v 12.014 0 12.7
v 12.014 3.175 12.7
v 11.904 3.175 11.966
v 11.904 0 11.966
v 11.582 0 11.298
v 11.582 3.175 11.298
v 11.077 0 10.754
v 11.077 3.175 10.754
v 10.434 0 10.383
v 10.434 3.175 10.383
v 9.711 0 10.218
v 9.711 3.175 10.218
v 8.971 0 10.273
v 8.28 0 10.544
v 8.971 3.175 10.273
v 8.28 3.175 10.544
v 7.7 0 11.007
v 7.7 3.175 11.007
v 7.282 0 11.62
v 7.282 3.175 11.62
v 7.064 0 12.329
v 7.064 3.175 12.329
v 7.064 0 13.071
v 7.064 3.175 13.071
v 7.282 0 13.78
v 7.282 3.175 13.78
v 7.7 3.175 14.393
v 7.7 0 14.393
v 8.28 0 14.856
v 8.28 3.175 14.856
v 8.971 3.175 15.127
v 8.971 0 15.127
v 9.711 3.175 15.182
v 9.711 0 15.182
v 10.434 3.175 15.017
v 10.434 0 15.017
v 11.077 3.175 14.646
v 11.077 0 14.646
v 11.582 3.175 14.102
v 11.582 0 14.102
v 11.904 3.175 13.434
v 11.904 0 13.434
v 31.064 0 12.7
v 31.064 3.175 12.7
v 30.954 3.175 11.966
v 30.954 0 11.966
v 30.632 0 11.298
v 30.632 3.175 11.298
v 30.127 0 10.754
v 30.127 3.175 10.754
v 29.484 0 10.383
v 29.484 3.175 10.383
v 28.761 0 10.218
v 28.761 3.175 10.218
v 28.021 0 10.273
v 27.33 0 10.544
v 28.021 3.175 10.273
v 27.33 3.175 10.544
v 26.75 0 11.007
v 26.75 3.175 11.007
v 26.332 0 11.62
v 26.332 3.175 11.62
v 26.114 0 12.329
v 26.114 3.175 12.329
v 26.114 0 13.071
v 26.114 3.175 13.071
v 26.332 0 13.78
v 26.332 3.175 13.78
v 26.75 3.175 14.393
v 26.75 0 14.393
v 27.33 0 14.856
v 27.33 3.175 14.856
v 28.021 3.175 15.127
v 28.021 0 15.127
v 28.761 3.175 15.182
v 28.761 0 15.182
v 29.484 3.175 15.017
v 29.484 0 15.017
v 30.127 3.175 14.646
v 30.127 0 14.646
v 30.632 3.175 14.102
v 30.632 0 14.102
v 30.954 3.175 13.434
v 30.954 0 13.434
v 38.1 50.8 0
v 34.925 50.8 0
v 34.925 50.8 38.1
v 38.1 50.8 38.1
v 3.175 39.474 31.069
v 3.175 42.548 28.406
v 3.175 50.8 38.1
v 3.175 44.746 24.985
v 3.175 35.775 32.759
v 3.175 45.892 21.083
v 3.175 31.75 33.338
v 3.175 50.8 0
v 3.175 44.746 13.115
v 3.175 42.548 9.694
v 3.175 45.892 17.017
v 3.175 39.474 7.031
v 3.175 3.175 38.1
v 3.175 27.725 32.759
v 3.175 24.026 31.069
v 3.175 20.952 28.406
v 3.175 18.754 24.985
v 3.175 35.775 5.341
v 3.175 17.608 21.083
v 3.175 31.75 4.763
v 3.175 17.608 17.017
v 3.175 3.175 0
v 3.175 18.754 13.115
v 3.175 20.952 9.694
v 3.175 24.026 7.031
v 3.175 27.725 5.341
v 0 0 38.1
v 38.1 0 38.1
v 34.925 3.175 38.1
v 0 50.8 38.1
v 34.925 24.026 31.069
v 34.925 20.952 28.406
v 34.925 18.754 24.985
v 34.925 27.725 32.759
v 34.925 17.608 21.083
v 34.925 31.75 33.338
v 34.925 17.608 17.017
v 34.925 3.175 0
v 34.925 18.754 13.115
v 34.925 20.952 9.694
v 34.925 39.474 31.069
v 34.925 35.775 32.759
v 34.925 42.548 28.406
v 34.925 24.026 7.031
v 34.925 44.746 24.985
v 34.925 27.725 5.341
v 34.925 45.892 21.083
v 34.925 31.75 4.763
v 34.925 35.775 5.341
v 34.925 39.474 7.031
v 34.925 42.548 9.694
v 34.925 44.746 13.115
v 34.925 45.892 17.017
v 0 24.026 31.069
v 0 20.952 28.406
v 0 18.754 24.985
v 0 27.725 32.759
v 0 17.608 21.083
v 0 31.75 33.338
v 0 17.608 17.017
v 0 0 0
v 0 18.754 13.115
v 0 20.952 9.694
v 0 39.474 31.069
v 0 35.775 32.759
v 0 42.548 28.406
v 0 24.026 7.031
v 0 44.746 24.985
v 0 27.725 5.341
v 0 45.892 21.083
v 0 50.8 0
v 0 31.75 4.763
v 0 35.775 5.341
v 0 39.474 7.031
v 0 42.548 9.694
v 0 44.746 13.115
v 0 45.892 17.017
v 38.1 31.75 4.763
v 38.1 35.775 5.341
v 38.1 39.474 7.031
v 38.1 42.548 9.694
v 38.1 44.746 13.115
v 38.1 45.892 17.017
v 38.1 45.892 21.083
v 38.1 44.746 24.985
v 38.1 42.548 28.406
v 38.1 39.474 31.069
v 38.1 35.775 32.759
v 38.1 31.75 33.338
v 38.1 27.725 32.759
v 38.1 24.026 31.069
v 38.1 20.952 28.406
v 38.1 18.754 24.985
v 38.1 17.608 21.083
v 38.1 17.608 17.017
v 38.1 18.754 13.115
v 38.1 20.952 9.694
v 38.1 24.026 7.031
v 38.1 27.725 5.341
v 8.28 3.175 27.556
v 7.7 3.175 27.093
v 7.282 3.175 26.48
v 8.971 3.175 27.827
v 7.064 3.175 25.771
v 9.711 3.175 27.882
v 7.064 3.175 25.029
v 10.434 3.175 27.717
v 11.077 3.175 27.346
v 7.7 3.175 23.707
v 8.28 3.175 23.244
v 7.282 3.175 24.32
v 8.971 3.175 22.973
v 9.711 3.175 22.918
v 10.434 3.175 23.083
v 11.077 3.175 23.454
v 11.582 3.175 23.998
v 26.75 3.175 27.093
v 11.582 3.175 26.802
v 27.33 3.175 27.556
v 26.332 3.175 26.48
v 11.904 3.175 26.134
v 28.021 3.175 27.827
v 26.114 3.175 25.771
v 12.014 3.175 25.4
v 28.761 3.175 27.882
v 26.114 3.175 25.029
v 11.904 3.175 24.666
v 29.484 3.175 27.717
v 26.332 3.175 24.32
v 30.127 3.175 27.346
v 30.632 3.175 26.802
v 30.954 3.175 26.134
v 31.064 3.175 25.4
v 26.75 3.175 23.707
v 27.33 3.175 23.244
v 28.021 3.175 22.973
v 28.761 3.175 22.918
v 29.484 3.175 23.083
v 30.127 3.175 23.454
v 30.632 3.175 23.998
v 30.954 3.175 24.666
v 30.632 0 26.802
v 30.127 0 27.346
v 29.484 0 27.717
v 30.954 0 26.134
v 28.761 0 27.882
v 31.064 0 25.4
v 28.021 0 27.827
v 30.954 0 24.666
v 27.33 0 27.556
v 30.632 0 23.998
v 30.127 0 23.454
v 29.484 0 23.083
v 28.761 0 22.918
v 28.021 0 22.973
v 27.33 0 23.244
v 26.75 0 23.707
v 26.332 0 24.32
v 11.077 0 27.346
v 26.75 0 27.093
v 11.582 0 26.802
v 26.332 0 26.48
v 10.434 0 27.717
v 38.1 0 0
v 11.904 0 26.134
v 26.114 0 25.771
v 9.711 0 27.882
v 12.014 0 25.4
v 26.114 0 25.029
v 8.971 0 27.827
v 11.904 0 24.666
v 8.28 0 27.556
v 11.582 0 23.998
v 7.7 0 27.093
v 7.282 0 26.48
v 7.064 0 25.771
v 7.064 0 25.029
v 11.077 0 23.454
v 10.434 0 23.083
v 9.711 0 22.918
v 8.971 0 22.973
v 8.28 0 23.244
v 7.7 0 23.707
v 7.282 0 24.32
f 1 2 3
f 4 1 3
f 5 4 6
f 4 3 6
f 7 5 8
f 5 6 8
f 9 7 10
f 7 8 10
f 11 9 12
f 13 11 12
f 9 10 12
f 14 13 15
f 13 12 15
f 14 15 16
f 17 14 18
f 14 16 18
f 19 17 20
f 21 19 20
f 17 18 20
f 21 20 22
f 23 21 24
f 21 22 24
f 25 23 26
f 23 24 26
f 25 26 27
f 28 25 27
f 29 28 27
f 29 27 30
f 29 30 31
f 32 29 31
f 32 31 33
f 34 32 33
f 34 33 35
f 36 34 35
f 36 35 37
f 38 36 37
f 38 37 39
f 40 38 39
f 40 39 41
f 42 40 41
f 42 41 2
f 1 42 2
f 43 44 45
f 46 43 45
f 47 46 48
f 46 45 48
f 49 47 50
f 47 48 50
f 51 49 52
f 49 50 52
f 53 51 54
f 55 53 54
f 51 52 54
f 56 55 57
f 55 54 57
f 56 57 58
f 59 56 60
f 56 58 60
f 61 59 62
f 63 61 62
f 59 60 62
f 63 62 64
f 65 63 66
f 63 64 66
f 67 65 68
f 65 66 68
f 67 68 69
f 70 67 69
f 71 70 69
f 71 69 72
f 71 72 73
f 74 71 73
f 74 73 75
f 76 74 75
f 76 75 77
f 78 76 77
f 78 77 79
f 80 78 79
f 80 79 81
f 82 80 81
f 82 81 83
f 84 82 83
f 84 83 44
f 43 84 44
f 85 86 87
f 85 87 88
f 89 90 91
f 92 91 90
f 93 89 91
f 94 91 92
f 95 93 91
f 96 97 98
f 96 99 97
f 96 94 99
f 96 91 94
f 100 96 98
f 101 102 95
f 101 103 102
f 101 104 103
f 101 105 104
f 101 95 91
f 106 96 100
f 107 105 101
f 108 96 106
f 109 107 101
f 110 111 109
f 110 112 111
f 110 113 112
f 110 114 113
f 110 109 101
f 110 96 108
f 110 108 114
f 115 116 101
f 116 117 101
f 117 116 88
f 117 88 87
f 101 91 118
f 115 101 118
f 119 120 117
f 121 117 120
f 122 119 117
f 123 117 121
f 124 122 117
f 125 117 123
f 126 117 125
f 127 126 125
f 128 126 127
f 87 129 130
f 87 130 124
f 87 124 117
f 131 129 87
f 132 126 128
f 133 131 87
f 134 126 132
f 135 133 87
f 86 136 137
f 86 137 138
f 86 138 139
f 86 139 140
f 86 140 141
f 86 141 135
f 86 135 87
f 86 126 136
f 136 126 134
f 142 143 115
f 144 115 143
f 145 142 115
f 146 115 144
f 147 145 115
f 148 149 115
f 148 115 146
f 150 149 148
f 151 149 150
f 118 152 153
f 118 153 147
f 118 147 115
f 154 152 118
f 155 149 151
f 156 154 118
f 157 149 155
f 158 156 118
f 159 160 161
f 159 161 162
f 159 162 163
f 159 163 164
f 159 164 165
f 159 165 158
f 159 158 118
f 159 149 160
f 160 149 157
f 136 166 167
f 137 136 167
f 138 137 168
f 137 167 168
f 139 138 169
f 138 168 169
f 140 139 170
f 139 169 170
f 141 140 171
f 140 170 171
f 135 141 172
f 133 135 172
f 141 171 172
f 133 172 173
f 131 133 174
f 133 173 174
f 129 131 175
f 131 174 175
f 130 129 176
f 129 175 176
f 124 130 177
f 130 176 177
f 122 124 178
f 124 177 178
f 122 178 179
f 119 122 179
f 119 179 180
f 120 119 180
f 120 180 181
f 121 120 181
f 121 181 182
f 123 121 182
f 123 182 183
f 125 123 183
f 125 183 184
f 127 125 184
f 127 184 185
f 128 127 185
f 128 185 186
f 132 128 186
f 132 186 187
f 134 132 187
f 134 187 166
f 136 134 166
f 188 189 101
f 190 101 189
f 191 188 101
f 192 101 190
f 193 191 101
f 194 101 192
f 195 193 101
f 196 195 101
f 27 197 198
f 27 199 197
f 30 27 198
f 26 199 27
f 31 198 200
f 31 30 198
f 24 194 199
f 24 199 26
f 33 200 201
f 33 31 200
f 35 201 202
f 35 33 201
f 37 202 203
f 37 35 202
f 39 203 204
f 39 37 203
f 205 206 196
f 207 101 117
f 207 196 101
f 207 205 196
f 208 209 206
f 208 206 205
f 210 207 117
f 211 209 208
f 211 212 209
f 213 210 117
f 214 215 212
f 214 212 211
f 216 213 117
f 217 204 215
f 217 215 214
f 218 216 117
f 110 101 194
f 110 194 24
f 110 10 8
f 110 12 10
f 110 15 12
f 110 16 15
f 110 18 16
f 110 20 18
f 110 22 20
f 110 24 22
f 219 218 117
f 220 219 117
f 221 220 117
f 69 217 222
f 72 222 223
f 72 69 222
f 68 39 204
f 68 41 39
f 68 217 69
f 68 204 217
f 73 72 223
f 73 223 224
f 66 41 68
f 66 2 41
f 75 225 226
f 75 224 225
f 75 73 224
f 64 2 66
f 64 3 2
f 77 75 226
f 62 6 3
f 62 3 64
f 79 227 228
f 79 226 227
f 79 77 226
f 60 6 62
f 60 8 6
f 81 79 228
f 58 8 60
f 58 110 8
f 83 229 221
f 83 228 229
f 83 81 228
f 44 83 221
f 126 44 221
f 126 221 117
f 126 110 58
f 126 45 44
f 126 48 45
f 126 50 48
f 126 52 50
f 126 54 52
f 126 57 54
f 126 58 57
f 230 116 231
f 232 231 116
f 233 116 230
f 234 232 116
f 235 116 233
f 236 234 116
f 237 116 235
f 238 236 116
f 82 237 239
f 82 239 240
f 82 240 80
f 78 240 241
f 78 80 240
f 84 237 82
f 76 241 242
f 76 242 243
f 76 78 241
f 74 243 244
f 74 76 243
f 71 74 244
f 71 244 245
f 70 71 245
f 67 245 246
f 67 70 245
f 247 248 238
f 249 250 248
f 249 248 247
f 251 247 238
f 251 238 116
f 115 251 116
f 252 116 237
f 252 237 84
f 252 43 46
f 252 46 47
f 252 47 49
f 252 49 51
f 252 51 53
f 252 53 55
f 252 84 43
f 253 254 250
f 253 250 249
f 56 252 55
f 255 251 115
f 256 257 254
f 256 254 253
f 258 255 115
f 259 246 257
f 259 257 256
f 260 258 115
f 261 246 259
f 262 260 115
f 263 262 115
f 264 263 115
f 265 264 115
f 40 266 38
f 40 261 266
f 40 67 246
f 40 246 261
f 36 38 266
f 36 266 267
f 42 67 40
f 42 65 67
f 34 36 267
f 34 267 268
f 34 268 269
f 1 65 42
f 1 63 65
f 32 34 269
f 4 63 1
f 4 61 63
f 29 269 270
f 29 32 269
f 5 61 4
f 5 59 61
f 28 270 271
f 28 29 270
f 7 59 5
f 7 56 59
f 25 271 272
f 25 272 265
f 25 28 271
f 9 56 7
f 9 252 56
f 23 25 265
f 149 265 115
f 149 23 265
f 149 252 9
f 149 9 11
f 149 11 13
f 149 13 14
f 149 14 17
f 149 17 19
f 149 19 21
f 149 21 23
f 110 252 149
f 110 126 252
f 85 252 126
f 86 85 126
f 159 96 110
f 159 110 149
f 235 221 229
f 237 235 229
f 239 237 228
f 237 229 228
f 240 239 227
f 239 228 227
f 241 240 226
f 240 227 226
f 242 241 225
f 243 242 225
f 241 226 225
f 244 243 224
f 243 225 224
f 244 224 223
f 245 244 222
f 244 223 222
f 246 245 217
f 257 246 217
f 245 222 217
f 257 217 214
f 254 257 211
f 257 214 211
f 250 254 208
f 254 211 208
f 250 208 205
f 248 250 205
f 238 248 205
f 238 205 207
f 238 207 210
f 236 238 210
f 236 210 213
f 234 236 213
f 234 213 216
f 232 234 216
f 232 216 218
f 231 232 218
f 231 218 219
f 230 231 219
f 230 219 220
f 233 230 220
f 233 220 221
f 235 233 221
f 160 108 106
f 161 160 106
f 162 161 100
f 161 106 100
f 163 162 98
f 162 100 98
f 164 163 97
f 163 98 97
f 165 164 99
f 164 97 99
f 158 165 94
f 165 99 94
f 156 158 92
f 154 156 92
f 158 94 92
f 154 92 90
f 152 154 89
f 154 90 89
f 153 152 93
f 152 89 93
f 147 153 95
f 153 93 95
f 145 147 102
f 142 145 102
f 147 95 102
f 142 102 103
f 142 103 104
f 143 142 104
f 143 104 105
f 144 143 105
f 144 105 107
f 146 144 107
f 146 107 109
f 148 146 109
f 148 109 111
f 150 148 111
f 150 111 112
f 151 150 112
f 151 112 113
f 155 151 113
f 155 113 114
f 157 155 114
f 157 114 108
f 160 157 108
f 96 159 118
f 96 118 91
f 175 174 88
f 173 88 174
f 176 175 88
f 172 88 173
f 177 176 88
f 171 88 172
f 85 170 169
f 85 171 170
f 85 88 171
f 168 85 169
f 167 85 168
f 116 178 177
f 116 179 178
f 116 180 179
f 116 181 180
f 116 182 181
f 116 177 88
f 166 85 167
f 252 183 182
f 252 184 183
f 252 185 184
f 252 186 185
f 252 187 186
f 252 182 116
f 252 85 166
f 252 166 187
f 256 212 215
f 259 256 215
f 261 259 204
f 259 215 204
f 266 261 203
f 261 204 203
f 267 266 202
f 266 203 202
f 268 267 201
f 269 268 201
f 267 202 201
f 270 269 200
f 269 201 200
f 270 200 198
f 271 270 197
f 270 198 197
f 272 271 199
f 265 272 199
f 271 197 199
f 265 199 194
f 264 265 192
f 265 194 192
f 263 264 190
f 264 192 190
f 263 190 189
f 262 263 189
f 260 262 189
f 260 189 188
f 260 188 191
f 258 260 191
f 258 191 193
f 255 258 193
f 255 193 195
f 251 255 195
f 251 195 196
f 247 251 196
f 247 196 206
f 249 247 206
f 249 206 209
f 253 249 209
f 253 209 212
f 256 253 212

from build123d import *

# Parameters (mm, degrees)
BOSS_EXTRUDE1_DEPTH = 38.1
SKETCH2_R           = 14.2875
CUT_EXTRUDE1_DEPTH  = 39.1
SKETCH3_R           = 2.4892
CUT_EXTRUDE2_DEPTH  = 4.175


with BuildPart() as part:
    # Sketch1 → Boss-Extrude1 (new body)
    with BuildSketch(Plane.XY):
        Polygon((0, 0), (0, 50.8), (3.175, 50.8), (3.175, 3.175), (34.925, 3.175), (34.925, 50.8), (38.1, 50.8), (38.1, 0), align=None)
    extrude(amount=BOSS_EXTRUDE1_DEPTH)

    # Sketch2 → Cut-Extrude1 (cut, through all)
    with BuildSketch(Plane(origin=(38.1, 0, 0), x_dir=(0, 0, -1), z_dir=(1, 0, 0))):
        with Locations((-19.05, 31.75)):
            Circle(SKETCH2_R)
    extrude(amount=-CUT_EXTRUDE1_DEPTH, mode=Mode.SUBTRACT)

    # Sketch3 → Cut-Extrude2 (cut, through all)
    with BuildSketch(Plane(origin=(0, 3.175, 0), x_dir=(1, 0, 0), z_dir=(0, 1, 0))):
        with Locations((9.525, -12.7)):
            Circle(SKETCH3_R)
        with Locations((9.525, -25.4)):
            Circle(SKETCH3_R)
        with Locations((28.575, -25.4)):
            Circle(SKETCH3_R)
        with Locations((28.575, -12.7)):
            Circle(SKETCH3_R)
    extrude(amount=-CUT_EXTRUDE2_DEPTH, mode=Mode.SUBTRACT)


solid = part.part
